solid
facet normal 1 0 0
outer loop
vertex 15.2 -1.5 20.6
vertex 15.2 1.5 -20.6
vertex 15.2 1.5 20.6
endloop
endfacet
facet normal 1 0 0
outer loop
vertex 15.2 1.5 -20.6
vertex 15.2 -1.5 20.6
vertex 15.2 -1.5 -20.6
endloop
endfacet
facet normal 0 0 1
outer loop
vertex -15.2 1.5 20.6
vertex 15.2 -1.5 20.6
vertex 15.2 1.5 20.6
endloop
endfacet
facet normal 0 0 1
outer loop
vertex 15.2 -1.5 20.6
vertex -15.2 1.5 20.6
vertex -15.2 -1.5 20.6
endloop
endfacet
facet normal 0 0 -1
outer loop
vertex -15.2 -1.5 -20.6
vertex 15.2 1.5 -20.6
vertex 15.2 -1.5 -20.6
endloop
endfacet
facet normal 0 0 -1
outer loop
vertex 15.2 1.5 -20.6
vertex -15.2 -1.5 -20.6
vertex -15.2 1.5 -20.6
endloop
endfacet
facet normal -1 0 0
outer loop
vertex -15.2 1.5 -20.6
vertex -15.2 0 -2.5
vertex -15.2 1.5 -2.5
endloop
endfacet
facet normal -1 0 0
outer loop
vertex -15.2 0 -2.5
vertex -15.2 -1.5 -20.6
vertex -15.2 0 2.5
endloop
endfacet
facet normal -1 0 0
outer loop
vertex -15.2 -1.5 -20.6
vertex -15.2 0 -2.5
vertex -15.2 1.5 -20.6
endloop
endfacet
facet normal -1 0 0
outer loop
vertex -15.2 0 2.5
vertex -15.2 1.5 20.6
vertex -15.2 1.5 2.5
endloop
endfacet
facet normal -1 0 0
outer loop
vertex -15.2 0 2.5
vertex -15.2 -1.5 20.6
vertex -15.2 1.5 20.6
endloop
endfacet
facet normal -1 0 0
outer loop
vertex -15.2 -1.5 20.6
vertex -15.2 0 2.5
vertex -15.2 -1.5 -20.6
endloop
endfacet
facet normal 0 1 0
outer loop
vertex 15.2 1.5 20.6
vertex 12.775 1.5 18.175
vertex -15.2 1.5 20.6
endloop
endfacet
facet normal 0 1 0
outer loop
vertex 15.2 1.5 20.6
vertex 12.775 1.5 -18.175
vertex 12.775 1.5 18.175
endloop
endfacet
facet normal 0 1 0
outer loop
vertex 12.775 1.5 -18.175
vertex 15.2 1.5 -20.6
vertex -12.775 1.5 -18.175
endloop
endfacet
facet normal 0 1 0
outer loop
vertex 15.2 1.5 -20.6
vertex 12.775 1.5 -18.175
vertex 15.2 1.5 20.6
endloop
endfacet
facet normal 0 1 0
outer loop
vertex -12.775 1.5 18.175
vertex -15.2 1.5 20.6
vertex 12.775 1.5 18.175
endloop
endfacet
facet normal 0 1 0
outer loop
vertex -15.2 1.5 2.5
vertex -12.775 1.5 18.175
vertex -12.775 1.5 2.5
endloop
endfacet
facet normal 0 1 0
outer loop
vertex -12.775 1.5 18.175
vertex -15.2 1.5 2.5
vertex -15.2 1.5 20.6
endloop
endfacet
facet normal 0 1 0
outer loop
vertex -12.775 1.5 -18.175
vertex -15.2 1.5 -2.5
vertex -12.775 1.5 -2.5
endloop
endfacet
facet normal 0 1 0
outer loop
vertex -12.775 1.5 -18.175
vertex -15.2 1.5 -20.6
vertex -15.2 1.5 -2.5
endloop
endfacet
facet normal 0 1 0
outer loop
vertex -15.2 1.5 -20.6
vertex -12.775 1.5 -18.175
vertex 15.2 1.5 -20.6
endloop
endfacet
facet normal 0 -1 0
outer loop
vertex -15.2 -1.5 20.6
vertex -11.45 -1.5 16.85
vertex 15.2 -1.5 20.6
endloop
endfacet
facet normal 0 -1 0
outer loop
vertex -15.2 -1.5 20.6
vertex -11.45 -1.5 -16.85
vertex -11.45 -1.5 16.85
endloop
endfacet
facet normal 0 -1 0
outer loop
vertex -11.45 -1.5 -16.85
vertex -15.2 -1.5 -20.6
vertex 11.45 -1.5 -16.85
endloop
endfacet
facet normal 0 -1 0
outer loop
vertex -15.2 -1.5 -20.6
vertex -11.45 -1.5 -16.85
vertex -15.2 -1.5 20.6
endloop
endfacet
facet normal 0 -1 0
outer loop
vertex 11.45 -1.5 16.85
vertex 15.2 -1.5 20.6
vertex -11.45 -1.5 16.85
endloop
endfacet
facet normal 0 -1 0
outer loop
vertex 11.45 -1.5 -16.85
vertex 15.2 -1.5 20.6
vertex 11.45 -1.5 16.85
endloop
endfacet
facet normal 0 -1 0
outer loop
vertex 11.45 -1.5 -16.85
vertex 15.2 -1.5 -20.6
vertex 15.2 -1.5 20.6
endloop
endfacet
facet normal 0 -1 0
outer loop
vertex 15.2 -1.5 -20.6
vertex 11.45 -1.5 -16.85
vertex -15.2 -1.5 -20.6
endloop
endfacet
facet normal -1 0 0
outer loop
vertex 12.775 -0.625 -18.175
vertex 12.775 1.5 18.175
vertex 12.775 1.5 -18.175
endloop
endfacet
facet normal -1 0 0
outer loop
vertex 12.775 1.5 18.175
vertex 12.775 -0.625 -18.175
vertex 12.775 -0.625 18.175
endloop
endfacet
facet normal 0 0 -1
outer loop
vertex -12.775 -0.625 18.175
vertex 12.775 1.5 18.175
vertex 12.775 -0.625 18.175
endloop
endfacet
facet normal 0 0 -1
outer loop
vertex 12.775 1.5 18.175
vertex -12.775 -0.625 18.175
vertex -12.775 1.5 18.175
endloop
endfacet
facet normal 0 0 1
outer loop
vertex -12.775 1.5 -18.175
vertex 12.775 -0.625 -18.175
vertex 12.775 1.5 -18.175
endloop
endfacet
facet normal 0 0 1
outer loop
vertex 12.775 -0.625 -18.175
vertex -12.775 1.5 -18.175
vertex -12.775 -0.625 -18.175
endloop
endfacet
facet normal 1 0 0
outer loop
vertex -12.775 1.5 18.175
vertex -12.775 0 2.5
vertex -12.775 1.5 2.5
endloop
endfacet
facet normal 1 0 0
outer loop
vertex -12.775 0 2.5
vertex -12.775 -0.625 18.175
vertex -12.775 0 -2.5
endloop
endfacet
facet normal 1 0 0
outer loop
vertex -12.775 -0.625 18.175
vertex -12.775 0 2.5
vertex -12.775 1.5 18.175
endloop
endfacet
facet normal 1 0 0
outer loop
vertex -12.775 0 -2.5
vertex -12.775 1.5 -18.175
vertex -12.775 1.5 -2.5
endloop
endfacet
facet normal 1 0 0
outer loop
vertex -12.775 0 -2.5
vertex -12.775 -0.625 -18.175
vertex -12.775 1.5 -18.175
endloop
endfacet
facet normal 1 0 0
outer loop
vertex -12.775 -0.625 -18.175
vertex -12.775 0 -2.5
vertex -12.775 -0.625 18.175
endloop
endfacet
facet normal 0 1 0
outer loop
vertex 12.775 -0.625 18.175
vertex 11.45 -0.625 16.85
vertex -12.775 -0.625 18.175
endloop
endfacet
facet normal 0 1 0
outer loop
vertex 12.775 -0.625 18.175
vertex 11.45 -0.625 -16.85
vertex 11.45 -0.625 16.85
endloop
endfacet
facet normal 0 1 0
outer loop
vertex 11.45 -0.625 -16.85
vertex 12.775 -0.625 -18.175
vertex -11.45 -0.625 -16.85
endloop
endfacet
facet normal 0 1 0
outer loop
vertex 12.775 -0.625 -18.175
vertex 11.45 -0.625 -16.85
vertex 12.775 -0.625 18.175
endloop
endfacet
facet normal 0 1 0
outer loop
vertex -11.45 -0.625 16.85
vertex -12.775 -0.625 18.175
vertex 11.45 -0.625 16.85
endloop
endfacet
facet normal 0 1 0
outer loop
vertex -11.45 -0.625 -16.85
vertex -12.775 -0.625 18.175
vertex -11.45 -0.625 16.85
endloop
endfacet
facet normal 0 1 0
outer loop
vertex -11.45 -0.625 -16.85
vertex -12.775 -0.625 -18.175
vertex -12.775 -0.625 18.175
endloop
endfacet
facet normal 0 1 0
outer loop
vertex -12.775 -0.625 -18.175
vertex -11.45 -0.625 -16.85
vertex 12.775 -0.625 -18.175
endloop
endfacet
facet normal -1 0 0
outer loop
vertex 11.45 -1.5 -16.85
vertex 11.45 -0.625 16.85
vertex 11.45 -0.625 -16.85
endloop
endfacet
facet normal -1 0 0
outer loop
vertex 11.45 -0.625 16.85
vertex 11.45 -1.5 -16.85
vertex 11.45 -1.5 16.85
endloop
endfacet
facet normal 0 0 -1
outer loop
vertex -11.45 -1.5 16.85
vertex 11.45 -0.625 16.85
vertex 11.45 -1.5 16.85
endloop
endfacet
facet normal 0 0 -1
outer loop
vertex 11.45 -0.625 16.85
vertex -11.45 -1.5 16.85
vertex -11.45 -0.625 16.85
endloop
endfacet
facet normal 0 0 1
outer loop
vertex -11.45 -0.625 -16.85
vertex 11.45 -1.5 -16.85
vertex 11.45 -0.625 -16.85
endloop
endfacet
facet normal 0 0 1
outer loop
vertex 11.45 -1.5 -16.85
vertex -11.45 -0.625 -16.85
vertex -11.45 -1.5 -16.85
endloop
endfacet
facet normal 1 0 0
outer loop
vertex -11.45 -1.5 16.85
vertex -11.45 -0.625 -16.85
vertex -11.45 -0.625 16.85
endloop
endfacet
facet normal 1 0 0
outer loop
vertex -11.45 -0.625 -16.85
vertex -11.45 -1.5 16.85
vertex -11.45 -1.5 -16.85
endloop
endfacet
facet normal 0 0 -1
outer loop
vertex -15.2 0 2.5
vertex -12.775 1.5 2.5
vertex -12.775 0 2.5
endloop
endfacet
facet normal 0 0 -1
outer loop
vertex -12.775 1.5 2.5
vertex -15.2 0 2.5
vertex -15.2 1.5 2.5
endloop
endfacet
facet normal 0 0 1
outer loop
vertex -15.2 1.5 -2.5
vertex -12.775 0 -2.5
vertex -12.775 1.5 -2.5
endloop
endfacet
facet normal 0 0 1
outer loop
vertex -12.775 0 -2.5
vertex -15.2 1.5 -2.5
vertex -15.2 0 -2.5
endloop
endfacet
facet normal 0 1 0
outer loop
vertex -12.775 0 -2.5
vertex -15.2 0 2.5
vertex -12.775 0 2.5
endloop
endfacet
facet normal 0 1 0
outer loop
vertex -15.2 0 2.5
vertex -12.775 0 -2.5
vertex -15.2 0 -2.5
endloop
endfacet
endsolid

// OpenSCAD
//*************************************//
//
//
//
//
//all units in mm.
//CC BY 4.0
//AM Chagas 20180516
//*************************************//

//variables
holed=6;
tol=0.15;
dist2hol = 42.42;//47.15-holed/2;
basethick=20;

dichx=25.4;
dichy=1;
dichz=36.2;
framey=3;

module mount_poles(){
//pole1
translate([dist2hol/2,0,0]){
cylinder(d=holed-tol,h=basethick,center=true,$fn=360);
}//translate
//pole2
translate([-dist2hol/2,0,0]){
cylinder(d=holed-tol,h=basethick,center=true,$fn=360);
}//translate
}//module

module main_holder(){
//dichr place

difference(){
cube([dist2hol+holed-tol,holed-tol+5,40],center=true);

translate([0,0,8]){
    cube([dichz+1,holed-tol+5,40],center=true);

 }//translate
translate([0,0,1.1]){
    rotate([0,90,0]){
        dich_frame1(dx=dichx+5+2*tol,dy=dichy+2+2*tol,dz=dichz+5+2*tol);
    }//rotate
}//translate
translate([0,0,8]){
    rotate([0,90,0]){
        dich_frame1(dx=dichx+5+2*tol,dy=dichy+2+2*tol,dz=dichz+5+2*tol);
    }//rotate
}//translate
}//difference
translate([0,0,-22]){
    cube([dist2hol+holed-tol,holed-tol+5,5],center=true);
}//translate
}//module

//translate([0,0,(basethick+15)/2]){
//main_holder();
//}

module dich_frame1(dx=dichx+5,dy=dichy+2,dz=dichz+5){
difference(){    
cube([dx,dy,dz],center=true);
translate([0,0.5,0]){
    cube([dx-5+tol,dy-0.9+tol,dz-5+tol],center=true);
    }//translate

cube([dx-7.5,dy+1,dz-7.5],center=true);


//translate([(dx-5)/2,1,0]){
//cube([10,dy-0,5],center=true);
//}//translate

translate([-(dx-5)/2,1,0]){
cube([10,dy-1,5],center=true);
}//translate

}//difference
}//module



//union(){

//main_holder();
/*translate([0,5,]){
rotate([0,90,0]){
dich_frame1();
}
}
*/
//translate([0,0,-dichz/2-5]){
//mount_poles();

//}
//}

dich_frame1();
